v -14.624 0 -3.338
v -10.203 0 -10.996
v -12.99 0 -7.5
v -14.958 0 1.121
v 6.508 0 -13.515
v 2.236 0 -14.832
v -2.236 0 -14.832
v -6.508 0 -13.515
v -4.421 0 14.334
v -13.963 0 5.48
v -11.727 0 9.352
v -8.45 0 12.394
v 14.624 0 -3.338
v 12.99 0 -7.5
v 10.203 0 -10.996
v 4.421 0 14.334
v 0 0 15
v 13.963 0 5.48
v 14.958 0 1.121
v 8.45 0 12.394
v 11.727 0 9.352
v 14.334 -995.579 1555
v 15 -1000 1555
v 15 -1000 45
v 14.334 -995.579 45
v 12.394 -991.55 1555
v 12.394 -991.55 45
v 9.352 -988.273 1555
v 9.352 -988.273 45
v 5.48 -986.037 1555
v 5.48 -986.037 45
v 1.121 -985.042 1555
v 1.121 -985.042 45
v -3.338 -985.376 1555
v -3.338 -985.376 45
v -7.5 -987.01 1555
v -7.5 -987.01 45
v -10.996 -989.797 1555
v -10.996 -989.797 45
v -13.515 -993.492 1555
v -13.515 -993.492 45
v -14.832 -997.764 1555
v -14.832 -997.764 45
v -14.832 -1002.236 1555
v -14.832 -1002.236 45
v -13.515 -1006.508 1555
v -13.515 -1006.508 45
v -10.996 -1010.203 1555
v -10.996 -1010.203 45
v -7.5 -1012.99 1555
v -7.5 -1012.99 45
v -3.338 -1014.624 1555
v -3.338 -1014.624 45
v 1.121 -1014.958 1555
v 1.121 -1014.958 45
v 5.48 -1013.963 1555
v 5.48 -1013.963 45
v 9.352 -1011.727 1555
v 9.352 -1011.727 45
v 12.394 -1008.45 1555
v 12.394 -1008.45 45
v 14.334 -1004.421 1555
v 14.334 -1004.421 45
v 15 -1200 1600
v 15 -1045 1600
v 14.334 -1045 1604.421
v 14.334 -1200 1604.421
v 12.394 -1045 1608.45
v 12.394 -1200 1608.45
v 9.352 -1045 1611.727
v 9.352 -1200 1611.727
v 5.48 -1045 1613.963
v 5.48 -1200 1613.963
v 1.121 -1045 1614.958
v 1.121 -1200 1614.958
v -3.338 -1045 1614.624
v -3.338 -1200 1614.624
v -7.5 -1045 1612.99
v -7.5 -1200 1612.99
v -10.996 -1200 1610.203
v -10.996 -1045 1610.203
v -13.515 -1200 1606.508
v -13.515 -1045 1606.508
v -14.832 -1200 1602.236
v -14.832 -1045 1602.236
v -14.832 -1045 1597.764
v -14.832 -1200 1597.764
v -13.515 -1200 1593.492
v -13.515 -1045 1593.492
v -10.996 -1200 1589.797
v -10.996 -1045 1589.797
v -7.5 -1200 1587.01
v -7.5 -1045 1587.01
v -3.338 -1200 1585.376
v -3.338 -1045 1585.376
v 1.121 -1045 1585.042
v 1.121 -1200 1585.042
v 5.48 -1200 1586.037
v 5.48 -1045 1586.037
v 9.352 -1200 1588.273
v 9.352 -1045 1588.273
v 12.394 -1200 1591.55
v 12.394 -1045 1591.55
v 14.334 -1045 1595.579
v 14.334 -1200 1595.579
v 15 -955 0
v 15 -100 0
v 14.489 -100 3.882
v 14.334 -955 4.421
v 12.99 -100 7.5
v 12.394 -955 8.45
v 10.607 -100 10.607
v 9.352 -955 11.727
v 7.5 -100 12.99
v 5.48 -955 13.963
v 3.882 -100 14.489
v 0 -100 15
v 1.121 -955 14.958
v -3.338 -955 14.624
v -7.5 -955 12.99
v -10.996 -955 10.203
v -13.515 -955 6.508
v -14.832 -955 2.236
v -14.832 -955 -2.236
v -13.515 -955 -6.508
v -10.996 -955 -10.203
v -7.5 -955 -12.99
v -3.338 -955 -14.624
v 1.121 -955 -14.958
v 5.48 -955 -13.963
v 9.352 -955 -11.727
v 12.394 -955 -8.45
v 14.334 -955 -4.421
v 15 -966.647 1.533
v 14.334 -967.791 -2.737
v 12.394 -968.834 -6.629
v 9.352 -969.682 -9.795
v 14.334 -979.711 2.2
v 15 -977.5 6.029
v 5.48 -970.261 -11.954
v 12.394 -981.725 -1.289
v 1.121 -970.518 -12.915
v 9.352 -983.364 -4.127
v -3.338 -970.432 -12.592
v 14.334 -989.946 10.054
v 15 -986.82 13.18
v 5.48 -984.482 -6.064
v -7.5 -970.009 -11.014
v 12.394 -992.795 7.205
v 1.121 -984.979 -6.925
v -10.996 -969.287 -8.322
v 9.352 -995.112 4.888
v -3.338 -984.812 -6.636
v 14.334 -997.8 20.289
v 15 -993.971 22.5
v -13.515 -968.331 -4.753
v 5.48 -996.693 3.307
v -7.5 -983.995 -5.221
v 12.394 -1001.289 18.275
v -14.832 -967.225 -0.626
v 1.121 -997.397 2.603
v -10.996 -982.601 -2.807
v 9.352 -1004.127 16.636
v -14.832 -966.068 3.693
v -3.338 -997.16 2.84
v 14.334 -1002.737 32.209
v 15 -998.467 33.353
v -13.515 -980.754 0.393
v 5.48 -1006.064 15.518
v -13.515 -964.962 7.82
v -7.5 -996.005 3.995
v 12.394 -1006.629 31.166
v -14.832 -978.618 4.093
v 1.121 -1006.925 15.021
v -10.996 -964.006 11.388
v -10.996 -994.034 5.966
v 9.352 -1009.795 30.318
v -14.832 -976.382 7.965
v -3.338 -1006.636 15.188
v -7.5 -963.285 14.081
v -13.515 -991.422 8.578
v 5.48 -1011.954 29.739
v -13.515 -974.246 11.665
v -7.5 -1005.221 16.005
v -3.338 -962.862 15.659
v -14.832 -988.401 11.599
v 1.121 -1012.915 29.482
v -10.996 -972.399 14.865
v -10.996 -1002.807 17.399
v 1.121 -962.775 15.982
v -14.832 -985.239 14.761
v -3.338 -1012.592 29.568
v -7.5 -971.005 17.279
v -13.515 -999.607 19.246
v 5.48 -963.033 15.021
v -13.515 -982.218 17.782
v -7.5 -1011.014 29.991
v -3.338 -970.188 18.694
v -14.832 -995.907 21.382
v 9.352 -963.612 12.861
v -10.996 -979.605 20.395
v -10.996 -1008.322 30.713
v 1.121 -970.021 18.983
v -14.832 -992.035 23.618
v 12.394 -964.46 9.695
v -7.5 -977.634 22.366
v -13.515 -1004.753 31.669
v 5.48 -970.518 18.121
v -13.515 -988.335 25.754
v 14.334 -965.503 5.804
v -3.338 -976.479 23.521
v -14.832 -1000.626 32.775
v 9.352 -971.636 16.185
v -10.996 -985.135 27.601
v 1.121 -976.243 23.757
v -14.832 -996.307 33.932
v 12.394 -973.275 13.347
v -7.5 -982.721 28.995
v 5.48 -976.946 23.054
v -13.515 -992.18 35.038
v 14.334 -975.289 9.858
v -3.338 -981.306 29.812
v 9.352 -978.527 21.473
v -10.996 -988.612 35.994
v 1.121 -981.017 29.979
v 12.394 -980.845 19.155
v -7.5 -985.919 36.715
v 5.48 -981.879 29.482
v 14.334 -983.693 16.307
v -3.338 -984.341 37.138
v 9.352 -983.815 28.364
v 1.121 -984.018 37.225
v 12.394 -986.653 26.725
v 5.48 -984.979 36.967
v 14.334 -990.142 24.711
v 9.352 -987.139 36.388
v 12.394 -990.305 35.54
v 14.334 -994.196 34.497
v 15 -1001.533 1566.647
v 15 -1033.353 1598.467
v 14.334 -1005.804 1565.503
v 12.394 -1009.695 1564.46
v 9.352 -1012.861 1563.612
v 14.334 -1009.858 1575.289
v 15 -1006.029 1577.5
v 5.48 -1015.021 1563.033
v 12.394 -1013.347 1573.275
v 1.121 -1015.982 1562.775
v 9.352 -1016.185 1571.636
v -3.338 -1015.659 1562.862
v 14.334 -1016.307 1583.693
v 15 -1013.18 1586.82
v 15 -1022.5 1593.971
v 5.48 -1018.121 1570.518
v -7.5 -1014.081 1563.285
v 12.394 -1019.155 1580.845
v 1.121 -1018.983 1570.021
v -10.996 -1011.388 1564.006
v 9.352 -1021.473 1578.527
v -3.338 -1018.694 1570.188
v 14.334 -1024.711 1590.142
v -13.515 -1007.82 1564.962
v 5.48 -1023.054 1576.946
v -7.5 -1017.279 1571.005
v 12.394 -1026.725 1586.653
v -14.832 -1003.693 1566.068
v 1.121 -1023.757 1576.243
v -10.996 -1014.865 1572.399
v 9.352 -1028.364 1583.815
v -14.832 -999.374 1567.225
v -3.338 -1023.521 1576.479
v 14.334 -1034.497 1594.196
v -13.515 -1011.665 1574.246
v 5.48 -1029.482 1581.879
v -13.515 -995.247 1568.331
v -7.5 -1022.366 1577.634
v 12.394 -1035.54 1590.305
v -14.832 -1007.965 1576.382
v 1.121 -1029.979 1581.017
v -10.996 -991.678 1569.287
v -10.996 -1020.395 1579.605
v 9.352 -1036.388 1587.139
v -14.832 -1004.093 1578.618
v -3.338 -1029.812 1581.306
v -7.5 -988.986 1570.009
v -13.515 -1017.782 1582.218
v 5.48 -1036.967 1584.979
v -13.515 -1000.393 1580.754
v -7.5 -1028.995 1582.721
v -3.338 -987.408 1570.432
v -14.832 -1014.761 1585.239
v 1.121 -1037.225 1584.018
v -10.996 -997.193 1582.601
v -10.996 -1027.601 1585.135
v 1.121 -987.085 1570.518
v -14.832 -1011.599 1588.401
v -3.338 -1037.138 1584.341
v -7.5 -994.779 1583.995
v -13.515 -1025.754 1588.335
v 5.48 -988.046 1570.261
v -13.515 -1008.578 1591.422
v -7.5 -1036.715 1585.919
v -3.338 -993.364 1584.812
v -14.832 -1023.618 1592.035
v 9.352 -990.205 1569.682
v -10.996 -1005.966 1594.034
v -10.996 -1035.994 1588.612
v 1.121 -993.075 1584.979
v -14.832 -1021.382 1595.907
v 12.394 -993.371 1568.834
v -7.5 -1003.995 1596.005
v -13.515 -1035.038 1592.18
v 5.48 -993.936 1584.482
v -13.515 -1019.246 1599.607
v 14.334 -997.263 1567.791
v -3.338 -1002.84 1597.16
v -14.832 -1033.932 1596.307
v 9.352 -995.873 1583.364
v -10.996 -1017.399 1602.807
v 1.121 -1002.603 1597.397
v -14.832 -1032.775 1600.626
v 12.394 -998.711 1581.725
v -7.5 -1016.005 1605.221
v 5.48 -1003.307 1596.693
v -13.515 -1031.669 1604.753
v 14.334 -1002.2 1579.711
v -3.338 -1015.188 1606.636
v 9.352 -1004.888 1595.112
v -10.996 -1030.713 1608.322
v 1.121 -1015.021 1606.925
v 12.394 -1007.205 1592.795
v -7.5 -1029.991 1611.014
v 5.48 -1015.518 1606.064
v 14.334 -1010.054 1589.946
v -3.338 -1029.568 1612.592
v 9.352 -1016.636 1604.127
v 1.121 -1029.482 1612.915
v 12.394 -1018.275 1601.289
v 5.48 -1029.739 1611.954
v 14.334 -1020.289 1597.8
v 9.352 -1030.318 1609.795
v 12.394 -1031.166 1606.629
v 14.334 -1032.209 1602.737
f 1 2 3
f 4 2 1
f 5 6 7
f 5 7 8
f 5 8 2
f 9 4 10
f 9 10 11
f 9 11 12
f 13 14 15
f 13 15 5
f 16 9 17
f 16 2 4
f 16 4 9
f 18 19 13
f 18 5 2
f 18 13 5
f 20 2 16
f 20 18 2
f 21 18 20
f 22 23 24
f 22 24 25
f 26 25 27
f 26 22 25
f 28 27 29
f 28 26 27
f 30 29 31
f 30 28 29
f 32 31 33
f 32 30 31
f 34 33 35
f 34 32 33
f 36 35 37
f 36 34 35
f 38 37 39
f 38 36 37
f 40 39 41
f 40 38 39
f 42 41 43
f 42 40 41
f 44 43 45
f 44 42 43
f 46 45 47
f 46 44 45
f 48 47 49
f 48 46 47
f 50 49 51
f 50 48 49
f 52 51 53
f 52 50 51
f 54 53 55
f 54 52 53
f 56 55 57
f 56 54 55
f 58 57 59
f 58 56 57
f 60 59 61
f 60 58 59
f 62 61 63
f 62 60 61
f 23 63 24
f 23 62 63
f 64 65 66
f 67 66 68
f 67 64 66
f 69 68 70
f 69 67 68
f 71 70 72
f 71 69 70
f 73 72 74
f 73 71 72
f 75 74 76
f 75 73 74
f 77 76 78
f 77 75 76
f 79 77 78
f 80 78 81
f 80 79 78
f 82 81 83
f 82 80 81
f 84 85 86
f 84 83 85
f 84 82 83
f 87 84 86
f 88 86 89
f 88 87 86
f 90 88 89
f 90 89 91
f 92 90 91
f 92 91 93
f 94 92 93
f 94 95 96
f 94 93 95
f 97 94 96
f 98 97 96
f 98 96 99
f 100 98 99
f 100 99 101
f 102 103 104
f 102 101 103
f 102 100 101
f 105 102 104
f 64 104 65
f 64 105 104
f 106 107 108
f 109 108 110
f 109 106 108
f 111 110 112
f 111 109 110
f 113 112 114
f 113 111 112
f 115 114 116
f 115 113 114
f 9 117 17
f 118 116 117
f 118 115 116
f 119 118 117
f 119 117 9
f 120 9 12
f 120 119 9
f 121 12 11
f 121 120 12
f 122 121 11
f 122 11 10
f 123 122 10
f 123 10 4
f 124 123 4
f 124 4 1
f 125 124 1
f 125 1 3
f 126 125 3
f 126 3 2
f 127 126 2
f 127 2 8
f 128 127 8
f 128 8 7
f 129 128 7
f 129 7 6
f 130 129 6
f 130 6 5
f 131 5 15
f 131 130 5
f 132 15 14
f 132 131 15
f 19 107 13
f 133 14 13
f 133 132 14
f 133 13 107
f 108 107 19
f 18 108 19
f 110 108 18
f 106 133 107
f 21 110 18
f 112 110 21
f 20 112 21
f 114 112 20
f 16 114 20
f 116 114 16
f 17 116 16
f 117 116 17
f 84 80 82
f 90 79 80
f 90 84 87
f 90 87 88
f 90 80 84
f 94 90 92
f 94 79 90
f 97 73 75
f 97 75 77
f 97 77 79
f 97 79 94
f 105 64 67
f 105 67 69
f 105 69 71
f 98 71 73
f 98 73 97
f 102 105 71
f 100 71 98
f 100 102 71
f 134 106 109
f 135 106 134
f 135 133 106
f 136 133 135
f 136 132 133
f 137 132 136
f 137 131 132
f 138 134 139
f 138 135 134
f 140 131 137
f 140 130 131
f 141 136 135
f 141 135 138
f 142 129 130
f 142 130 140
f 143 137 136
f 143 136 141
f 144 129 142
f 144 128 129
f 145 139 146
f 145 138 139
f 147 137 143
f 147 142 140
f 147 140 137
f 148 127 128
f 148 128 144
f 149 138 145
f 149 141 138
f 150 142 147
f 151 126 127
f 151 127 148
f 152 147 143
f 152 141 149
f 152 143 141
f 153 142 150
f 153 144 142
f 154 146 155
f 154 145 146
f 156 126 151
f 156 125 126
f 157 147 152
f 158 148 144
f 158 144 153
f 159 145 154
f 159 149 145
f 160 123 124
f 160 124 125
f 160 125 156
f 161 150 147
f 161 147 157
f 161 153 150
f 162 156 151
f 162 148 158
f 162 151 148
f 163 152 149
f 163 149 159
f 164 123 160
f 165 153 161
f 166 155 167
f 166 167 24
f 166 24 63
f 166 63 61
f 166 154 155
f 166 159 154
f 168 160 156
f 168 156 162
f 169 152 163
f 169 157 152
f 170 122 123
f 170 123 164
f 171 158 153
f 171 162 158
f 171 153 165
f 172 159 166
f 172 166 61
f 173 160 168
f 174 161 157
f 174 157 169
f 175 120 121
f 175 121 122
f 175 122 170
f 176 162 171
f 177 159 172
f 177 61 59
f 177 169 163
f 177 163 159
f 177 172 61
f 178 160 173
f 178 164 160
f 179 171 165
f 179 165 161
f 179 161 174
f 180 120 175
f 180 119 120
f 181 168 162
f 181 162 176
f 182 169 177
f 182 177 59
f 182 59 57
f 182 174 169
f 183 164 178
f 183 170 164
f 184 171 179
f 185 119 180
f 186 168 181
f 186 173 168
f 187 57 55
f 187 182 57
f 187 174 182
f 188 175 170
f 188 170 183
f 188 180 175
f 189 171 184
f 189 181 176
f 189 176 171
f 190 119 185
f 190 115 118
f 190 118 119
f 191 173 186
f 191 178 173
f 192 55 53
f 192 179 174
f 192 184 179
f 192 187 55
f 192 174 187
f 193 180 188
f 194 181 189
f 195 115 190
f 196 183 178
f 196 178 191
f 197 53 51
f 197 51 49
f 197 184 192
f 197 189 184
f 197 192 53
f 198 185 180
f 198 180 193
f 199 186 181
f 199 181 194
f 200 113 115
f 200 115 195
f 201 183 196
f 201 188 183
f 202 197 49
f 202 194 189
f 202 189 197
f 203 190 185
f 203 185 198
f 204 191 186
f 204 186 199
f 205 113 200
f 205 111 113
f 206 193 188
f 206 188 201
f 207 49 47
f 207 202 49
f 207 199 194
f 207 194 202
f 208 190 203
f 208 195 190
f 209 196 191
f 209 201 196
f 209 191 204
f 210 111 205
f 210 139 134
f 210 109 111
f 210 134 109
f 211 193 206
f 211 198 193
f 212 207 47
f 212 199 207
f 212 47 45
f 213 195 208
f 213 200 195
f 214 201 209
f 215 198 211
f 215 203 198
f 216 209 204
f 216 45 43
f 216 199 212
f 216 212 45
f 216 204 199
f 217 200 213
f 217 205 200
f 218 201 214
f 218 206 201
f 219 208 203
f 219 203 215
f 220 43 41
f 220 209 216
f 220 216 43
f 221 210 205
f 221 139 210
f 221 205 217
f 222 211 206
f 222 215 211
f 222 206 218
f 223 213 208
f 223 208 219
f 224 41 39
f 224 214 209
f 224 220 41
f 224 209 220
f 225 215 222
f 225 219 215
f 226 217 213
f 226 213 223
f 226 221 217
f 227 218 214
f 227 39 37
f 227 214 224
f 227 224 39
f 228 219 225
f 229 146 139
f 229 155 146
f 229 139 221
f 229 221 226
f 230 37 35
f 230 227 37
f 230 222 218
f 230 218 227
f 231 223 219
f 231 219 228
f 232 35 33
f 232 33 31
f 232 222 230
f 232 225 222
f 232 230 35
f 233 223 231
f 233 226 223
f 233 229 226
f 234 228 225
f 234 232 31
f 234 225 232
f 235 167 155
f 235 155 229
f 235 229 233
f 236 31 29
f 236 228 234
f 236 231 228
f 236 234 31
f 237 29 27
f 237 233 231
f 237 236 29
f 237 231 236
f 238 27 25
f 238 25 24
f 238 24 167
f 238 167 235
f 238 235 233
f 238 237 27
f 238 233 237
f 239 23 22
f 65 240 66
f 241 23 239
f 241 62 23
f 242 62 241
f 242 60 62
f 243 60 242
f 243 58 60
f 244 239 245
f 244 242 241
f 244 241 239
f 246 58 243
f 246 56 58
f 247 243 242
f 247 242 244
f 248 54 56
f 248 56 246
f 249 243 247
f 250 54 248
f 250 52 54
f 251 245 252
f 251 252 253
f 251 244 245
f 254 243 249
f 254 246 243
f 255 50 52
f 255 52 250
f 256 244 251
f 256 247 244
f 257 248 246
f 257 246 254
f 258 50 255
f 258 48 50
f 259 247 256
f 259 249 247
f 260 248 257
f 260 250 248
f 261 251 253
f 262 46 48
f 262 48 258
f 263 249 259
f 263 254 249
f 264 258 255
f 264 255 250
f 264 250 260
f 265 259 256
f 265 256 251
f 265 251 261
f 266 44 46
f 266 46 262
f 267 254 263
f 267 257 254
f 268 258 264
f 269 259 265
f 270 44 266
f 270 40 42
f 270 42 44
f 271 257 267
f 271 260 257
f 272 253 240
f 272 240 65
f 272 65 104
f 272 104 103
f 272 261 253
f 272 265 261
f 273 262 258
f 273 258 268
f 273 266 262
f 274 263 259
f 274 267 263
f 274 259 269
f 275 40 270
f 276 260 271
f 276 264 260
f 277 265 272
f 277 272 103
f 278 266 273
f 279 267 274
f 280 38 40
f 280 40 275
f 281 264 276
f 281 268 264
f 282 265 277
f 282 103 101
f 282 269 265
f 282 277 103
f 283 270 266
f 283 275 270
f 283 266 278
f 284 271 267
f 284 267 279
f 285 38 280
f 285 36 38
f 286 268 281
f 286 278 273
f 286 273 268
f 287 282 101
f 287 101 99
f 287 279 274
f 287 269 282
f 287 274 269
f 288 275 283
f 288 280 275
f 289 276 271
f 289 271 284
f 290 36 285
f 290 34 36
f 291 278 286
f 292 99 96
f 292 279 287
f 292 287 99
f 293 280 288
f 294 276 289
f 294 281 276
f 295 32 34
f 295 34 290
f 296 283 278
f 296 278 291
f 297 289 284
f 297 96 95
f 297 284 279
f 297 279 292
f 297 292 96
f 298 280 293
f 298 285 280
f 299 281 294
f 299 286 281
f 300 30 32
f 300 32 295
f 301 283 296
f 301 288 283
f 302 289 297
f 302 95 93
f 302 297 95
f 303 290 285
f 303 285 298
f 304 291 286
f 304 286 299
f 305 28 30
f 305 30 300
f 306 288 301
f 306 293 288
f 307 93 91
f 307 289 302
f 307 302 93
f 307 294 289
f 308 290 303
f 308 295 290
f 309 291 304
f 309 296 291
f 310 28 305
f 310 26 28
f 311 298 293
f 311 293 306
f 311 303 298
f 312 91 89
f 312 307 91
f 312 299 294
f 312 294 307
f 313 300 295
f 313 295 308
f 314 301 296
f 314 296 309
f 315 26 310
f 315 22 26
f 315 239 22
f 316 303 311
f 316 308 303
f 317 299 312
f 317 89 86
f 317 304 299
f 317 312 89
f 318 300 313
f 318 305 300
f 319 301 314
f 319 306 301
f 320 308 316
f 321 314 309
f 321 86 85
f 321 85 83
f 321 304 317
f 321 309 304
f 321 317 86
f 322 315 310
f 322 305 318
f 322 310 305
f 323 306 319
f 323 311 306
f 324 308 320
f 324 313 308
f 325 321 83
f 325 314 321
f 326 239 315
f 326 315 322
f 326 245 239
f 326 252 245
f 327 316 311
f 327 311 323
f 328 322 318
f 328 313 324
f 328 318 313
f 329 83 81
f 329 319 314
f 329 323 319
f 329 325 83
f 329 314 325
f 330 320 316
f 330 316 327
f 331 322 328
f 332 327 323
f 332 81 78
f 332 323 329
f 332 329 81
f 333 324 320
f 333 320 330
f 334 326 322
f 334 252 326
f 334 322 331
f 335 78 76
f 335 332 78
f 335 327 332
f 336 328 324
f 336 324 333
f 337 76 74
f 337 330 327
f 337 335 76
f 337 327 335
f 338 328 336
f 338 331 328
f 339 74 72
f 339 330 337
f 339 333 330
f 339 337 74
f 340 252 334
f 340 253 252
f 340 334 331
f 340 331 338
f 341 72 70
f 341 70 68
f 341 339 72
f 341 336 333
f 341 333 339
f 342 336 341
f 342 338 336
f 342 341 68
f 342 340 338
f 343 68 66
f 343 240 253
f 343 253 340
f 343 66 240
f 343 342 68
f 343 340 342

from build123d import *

# Parameters (mm, degrees)
CROQUIS1_R              = 15
SALIENTE_EXTRUIR1_DEPTH = 100
CROQUIS2_R              = 15


with BuildPart() as part:
    # Croquis1 → Saliente-Extruir1 (new body)
    with BuildSketch(Plane(origin=(0, 0, 0), x_dir=(1, 0, 0), z_dir=(0, 1, 0))):
        with Locations(Location((0, 0, 0), (0, 0, 270))):
            Circle(CROQUIS1_R)
    extrude(amount=-SALIENTE_EXTRUIR1_DEPTH)

    # Barrer1: sweep along a curve in space
    with BuildLine() as barrer1_path:
        Line((0, -100, 0), (0, -955, 0))
        ThreePointArc((0, -955, 0), (0, -986.819805153, 13.180194847), (0, -1000, 45))
        Line((0, -1000, 45), (0, -1000, 1555))
        ThreePointArc((0, -1000, 1555), (0, -1013.180194847, 1586.819805153), (0, -1045, 1600))
        Line((0, -1045, 1600), (0, -1200, 1600))
    # Croquis2 → Barrer1 (sweep)
    with BuildSketch(Plane.XZ.offset(100)):
        Circle(CROQUIS2_R)
    sweep(path=barrer1_path.line)


solid = part.part
